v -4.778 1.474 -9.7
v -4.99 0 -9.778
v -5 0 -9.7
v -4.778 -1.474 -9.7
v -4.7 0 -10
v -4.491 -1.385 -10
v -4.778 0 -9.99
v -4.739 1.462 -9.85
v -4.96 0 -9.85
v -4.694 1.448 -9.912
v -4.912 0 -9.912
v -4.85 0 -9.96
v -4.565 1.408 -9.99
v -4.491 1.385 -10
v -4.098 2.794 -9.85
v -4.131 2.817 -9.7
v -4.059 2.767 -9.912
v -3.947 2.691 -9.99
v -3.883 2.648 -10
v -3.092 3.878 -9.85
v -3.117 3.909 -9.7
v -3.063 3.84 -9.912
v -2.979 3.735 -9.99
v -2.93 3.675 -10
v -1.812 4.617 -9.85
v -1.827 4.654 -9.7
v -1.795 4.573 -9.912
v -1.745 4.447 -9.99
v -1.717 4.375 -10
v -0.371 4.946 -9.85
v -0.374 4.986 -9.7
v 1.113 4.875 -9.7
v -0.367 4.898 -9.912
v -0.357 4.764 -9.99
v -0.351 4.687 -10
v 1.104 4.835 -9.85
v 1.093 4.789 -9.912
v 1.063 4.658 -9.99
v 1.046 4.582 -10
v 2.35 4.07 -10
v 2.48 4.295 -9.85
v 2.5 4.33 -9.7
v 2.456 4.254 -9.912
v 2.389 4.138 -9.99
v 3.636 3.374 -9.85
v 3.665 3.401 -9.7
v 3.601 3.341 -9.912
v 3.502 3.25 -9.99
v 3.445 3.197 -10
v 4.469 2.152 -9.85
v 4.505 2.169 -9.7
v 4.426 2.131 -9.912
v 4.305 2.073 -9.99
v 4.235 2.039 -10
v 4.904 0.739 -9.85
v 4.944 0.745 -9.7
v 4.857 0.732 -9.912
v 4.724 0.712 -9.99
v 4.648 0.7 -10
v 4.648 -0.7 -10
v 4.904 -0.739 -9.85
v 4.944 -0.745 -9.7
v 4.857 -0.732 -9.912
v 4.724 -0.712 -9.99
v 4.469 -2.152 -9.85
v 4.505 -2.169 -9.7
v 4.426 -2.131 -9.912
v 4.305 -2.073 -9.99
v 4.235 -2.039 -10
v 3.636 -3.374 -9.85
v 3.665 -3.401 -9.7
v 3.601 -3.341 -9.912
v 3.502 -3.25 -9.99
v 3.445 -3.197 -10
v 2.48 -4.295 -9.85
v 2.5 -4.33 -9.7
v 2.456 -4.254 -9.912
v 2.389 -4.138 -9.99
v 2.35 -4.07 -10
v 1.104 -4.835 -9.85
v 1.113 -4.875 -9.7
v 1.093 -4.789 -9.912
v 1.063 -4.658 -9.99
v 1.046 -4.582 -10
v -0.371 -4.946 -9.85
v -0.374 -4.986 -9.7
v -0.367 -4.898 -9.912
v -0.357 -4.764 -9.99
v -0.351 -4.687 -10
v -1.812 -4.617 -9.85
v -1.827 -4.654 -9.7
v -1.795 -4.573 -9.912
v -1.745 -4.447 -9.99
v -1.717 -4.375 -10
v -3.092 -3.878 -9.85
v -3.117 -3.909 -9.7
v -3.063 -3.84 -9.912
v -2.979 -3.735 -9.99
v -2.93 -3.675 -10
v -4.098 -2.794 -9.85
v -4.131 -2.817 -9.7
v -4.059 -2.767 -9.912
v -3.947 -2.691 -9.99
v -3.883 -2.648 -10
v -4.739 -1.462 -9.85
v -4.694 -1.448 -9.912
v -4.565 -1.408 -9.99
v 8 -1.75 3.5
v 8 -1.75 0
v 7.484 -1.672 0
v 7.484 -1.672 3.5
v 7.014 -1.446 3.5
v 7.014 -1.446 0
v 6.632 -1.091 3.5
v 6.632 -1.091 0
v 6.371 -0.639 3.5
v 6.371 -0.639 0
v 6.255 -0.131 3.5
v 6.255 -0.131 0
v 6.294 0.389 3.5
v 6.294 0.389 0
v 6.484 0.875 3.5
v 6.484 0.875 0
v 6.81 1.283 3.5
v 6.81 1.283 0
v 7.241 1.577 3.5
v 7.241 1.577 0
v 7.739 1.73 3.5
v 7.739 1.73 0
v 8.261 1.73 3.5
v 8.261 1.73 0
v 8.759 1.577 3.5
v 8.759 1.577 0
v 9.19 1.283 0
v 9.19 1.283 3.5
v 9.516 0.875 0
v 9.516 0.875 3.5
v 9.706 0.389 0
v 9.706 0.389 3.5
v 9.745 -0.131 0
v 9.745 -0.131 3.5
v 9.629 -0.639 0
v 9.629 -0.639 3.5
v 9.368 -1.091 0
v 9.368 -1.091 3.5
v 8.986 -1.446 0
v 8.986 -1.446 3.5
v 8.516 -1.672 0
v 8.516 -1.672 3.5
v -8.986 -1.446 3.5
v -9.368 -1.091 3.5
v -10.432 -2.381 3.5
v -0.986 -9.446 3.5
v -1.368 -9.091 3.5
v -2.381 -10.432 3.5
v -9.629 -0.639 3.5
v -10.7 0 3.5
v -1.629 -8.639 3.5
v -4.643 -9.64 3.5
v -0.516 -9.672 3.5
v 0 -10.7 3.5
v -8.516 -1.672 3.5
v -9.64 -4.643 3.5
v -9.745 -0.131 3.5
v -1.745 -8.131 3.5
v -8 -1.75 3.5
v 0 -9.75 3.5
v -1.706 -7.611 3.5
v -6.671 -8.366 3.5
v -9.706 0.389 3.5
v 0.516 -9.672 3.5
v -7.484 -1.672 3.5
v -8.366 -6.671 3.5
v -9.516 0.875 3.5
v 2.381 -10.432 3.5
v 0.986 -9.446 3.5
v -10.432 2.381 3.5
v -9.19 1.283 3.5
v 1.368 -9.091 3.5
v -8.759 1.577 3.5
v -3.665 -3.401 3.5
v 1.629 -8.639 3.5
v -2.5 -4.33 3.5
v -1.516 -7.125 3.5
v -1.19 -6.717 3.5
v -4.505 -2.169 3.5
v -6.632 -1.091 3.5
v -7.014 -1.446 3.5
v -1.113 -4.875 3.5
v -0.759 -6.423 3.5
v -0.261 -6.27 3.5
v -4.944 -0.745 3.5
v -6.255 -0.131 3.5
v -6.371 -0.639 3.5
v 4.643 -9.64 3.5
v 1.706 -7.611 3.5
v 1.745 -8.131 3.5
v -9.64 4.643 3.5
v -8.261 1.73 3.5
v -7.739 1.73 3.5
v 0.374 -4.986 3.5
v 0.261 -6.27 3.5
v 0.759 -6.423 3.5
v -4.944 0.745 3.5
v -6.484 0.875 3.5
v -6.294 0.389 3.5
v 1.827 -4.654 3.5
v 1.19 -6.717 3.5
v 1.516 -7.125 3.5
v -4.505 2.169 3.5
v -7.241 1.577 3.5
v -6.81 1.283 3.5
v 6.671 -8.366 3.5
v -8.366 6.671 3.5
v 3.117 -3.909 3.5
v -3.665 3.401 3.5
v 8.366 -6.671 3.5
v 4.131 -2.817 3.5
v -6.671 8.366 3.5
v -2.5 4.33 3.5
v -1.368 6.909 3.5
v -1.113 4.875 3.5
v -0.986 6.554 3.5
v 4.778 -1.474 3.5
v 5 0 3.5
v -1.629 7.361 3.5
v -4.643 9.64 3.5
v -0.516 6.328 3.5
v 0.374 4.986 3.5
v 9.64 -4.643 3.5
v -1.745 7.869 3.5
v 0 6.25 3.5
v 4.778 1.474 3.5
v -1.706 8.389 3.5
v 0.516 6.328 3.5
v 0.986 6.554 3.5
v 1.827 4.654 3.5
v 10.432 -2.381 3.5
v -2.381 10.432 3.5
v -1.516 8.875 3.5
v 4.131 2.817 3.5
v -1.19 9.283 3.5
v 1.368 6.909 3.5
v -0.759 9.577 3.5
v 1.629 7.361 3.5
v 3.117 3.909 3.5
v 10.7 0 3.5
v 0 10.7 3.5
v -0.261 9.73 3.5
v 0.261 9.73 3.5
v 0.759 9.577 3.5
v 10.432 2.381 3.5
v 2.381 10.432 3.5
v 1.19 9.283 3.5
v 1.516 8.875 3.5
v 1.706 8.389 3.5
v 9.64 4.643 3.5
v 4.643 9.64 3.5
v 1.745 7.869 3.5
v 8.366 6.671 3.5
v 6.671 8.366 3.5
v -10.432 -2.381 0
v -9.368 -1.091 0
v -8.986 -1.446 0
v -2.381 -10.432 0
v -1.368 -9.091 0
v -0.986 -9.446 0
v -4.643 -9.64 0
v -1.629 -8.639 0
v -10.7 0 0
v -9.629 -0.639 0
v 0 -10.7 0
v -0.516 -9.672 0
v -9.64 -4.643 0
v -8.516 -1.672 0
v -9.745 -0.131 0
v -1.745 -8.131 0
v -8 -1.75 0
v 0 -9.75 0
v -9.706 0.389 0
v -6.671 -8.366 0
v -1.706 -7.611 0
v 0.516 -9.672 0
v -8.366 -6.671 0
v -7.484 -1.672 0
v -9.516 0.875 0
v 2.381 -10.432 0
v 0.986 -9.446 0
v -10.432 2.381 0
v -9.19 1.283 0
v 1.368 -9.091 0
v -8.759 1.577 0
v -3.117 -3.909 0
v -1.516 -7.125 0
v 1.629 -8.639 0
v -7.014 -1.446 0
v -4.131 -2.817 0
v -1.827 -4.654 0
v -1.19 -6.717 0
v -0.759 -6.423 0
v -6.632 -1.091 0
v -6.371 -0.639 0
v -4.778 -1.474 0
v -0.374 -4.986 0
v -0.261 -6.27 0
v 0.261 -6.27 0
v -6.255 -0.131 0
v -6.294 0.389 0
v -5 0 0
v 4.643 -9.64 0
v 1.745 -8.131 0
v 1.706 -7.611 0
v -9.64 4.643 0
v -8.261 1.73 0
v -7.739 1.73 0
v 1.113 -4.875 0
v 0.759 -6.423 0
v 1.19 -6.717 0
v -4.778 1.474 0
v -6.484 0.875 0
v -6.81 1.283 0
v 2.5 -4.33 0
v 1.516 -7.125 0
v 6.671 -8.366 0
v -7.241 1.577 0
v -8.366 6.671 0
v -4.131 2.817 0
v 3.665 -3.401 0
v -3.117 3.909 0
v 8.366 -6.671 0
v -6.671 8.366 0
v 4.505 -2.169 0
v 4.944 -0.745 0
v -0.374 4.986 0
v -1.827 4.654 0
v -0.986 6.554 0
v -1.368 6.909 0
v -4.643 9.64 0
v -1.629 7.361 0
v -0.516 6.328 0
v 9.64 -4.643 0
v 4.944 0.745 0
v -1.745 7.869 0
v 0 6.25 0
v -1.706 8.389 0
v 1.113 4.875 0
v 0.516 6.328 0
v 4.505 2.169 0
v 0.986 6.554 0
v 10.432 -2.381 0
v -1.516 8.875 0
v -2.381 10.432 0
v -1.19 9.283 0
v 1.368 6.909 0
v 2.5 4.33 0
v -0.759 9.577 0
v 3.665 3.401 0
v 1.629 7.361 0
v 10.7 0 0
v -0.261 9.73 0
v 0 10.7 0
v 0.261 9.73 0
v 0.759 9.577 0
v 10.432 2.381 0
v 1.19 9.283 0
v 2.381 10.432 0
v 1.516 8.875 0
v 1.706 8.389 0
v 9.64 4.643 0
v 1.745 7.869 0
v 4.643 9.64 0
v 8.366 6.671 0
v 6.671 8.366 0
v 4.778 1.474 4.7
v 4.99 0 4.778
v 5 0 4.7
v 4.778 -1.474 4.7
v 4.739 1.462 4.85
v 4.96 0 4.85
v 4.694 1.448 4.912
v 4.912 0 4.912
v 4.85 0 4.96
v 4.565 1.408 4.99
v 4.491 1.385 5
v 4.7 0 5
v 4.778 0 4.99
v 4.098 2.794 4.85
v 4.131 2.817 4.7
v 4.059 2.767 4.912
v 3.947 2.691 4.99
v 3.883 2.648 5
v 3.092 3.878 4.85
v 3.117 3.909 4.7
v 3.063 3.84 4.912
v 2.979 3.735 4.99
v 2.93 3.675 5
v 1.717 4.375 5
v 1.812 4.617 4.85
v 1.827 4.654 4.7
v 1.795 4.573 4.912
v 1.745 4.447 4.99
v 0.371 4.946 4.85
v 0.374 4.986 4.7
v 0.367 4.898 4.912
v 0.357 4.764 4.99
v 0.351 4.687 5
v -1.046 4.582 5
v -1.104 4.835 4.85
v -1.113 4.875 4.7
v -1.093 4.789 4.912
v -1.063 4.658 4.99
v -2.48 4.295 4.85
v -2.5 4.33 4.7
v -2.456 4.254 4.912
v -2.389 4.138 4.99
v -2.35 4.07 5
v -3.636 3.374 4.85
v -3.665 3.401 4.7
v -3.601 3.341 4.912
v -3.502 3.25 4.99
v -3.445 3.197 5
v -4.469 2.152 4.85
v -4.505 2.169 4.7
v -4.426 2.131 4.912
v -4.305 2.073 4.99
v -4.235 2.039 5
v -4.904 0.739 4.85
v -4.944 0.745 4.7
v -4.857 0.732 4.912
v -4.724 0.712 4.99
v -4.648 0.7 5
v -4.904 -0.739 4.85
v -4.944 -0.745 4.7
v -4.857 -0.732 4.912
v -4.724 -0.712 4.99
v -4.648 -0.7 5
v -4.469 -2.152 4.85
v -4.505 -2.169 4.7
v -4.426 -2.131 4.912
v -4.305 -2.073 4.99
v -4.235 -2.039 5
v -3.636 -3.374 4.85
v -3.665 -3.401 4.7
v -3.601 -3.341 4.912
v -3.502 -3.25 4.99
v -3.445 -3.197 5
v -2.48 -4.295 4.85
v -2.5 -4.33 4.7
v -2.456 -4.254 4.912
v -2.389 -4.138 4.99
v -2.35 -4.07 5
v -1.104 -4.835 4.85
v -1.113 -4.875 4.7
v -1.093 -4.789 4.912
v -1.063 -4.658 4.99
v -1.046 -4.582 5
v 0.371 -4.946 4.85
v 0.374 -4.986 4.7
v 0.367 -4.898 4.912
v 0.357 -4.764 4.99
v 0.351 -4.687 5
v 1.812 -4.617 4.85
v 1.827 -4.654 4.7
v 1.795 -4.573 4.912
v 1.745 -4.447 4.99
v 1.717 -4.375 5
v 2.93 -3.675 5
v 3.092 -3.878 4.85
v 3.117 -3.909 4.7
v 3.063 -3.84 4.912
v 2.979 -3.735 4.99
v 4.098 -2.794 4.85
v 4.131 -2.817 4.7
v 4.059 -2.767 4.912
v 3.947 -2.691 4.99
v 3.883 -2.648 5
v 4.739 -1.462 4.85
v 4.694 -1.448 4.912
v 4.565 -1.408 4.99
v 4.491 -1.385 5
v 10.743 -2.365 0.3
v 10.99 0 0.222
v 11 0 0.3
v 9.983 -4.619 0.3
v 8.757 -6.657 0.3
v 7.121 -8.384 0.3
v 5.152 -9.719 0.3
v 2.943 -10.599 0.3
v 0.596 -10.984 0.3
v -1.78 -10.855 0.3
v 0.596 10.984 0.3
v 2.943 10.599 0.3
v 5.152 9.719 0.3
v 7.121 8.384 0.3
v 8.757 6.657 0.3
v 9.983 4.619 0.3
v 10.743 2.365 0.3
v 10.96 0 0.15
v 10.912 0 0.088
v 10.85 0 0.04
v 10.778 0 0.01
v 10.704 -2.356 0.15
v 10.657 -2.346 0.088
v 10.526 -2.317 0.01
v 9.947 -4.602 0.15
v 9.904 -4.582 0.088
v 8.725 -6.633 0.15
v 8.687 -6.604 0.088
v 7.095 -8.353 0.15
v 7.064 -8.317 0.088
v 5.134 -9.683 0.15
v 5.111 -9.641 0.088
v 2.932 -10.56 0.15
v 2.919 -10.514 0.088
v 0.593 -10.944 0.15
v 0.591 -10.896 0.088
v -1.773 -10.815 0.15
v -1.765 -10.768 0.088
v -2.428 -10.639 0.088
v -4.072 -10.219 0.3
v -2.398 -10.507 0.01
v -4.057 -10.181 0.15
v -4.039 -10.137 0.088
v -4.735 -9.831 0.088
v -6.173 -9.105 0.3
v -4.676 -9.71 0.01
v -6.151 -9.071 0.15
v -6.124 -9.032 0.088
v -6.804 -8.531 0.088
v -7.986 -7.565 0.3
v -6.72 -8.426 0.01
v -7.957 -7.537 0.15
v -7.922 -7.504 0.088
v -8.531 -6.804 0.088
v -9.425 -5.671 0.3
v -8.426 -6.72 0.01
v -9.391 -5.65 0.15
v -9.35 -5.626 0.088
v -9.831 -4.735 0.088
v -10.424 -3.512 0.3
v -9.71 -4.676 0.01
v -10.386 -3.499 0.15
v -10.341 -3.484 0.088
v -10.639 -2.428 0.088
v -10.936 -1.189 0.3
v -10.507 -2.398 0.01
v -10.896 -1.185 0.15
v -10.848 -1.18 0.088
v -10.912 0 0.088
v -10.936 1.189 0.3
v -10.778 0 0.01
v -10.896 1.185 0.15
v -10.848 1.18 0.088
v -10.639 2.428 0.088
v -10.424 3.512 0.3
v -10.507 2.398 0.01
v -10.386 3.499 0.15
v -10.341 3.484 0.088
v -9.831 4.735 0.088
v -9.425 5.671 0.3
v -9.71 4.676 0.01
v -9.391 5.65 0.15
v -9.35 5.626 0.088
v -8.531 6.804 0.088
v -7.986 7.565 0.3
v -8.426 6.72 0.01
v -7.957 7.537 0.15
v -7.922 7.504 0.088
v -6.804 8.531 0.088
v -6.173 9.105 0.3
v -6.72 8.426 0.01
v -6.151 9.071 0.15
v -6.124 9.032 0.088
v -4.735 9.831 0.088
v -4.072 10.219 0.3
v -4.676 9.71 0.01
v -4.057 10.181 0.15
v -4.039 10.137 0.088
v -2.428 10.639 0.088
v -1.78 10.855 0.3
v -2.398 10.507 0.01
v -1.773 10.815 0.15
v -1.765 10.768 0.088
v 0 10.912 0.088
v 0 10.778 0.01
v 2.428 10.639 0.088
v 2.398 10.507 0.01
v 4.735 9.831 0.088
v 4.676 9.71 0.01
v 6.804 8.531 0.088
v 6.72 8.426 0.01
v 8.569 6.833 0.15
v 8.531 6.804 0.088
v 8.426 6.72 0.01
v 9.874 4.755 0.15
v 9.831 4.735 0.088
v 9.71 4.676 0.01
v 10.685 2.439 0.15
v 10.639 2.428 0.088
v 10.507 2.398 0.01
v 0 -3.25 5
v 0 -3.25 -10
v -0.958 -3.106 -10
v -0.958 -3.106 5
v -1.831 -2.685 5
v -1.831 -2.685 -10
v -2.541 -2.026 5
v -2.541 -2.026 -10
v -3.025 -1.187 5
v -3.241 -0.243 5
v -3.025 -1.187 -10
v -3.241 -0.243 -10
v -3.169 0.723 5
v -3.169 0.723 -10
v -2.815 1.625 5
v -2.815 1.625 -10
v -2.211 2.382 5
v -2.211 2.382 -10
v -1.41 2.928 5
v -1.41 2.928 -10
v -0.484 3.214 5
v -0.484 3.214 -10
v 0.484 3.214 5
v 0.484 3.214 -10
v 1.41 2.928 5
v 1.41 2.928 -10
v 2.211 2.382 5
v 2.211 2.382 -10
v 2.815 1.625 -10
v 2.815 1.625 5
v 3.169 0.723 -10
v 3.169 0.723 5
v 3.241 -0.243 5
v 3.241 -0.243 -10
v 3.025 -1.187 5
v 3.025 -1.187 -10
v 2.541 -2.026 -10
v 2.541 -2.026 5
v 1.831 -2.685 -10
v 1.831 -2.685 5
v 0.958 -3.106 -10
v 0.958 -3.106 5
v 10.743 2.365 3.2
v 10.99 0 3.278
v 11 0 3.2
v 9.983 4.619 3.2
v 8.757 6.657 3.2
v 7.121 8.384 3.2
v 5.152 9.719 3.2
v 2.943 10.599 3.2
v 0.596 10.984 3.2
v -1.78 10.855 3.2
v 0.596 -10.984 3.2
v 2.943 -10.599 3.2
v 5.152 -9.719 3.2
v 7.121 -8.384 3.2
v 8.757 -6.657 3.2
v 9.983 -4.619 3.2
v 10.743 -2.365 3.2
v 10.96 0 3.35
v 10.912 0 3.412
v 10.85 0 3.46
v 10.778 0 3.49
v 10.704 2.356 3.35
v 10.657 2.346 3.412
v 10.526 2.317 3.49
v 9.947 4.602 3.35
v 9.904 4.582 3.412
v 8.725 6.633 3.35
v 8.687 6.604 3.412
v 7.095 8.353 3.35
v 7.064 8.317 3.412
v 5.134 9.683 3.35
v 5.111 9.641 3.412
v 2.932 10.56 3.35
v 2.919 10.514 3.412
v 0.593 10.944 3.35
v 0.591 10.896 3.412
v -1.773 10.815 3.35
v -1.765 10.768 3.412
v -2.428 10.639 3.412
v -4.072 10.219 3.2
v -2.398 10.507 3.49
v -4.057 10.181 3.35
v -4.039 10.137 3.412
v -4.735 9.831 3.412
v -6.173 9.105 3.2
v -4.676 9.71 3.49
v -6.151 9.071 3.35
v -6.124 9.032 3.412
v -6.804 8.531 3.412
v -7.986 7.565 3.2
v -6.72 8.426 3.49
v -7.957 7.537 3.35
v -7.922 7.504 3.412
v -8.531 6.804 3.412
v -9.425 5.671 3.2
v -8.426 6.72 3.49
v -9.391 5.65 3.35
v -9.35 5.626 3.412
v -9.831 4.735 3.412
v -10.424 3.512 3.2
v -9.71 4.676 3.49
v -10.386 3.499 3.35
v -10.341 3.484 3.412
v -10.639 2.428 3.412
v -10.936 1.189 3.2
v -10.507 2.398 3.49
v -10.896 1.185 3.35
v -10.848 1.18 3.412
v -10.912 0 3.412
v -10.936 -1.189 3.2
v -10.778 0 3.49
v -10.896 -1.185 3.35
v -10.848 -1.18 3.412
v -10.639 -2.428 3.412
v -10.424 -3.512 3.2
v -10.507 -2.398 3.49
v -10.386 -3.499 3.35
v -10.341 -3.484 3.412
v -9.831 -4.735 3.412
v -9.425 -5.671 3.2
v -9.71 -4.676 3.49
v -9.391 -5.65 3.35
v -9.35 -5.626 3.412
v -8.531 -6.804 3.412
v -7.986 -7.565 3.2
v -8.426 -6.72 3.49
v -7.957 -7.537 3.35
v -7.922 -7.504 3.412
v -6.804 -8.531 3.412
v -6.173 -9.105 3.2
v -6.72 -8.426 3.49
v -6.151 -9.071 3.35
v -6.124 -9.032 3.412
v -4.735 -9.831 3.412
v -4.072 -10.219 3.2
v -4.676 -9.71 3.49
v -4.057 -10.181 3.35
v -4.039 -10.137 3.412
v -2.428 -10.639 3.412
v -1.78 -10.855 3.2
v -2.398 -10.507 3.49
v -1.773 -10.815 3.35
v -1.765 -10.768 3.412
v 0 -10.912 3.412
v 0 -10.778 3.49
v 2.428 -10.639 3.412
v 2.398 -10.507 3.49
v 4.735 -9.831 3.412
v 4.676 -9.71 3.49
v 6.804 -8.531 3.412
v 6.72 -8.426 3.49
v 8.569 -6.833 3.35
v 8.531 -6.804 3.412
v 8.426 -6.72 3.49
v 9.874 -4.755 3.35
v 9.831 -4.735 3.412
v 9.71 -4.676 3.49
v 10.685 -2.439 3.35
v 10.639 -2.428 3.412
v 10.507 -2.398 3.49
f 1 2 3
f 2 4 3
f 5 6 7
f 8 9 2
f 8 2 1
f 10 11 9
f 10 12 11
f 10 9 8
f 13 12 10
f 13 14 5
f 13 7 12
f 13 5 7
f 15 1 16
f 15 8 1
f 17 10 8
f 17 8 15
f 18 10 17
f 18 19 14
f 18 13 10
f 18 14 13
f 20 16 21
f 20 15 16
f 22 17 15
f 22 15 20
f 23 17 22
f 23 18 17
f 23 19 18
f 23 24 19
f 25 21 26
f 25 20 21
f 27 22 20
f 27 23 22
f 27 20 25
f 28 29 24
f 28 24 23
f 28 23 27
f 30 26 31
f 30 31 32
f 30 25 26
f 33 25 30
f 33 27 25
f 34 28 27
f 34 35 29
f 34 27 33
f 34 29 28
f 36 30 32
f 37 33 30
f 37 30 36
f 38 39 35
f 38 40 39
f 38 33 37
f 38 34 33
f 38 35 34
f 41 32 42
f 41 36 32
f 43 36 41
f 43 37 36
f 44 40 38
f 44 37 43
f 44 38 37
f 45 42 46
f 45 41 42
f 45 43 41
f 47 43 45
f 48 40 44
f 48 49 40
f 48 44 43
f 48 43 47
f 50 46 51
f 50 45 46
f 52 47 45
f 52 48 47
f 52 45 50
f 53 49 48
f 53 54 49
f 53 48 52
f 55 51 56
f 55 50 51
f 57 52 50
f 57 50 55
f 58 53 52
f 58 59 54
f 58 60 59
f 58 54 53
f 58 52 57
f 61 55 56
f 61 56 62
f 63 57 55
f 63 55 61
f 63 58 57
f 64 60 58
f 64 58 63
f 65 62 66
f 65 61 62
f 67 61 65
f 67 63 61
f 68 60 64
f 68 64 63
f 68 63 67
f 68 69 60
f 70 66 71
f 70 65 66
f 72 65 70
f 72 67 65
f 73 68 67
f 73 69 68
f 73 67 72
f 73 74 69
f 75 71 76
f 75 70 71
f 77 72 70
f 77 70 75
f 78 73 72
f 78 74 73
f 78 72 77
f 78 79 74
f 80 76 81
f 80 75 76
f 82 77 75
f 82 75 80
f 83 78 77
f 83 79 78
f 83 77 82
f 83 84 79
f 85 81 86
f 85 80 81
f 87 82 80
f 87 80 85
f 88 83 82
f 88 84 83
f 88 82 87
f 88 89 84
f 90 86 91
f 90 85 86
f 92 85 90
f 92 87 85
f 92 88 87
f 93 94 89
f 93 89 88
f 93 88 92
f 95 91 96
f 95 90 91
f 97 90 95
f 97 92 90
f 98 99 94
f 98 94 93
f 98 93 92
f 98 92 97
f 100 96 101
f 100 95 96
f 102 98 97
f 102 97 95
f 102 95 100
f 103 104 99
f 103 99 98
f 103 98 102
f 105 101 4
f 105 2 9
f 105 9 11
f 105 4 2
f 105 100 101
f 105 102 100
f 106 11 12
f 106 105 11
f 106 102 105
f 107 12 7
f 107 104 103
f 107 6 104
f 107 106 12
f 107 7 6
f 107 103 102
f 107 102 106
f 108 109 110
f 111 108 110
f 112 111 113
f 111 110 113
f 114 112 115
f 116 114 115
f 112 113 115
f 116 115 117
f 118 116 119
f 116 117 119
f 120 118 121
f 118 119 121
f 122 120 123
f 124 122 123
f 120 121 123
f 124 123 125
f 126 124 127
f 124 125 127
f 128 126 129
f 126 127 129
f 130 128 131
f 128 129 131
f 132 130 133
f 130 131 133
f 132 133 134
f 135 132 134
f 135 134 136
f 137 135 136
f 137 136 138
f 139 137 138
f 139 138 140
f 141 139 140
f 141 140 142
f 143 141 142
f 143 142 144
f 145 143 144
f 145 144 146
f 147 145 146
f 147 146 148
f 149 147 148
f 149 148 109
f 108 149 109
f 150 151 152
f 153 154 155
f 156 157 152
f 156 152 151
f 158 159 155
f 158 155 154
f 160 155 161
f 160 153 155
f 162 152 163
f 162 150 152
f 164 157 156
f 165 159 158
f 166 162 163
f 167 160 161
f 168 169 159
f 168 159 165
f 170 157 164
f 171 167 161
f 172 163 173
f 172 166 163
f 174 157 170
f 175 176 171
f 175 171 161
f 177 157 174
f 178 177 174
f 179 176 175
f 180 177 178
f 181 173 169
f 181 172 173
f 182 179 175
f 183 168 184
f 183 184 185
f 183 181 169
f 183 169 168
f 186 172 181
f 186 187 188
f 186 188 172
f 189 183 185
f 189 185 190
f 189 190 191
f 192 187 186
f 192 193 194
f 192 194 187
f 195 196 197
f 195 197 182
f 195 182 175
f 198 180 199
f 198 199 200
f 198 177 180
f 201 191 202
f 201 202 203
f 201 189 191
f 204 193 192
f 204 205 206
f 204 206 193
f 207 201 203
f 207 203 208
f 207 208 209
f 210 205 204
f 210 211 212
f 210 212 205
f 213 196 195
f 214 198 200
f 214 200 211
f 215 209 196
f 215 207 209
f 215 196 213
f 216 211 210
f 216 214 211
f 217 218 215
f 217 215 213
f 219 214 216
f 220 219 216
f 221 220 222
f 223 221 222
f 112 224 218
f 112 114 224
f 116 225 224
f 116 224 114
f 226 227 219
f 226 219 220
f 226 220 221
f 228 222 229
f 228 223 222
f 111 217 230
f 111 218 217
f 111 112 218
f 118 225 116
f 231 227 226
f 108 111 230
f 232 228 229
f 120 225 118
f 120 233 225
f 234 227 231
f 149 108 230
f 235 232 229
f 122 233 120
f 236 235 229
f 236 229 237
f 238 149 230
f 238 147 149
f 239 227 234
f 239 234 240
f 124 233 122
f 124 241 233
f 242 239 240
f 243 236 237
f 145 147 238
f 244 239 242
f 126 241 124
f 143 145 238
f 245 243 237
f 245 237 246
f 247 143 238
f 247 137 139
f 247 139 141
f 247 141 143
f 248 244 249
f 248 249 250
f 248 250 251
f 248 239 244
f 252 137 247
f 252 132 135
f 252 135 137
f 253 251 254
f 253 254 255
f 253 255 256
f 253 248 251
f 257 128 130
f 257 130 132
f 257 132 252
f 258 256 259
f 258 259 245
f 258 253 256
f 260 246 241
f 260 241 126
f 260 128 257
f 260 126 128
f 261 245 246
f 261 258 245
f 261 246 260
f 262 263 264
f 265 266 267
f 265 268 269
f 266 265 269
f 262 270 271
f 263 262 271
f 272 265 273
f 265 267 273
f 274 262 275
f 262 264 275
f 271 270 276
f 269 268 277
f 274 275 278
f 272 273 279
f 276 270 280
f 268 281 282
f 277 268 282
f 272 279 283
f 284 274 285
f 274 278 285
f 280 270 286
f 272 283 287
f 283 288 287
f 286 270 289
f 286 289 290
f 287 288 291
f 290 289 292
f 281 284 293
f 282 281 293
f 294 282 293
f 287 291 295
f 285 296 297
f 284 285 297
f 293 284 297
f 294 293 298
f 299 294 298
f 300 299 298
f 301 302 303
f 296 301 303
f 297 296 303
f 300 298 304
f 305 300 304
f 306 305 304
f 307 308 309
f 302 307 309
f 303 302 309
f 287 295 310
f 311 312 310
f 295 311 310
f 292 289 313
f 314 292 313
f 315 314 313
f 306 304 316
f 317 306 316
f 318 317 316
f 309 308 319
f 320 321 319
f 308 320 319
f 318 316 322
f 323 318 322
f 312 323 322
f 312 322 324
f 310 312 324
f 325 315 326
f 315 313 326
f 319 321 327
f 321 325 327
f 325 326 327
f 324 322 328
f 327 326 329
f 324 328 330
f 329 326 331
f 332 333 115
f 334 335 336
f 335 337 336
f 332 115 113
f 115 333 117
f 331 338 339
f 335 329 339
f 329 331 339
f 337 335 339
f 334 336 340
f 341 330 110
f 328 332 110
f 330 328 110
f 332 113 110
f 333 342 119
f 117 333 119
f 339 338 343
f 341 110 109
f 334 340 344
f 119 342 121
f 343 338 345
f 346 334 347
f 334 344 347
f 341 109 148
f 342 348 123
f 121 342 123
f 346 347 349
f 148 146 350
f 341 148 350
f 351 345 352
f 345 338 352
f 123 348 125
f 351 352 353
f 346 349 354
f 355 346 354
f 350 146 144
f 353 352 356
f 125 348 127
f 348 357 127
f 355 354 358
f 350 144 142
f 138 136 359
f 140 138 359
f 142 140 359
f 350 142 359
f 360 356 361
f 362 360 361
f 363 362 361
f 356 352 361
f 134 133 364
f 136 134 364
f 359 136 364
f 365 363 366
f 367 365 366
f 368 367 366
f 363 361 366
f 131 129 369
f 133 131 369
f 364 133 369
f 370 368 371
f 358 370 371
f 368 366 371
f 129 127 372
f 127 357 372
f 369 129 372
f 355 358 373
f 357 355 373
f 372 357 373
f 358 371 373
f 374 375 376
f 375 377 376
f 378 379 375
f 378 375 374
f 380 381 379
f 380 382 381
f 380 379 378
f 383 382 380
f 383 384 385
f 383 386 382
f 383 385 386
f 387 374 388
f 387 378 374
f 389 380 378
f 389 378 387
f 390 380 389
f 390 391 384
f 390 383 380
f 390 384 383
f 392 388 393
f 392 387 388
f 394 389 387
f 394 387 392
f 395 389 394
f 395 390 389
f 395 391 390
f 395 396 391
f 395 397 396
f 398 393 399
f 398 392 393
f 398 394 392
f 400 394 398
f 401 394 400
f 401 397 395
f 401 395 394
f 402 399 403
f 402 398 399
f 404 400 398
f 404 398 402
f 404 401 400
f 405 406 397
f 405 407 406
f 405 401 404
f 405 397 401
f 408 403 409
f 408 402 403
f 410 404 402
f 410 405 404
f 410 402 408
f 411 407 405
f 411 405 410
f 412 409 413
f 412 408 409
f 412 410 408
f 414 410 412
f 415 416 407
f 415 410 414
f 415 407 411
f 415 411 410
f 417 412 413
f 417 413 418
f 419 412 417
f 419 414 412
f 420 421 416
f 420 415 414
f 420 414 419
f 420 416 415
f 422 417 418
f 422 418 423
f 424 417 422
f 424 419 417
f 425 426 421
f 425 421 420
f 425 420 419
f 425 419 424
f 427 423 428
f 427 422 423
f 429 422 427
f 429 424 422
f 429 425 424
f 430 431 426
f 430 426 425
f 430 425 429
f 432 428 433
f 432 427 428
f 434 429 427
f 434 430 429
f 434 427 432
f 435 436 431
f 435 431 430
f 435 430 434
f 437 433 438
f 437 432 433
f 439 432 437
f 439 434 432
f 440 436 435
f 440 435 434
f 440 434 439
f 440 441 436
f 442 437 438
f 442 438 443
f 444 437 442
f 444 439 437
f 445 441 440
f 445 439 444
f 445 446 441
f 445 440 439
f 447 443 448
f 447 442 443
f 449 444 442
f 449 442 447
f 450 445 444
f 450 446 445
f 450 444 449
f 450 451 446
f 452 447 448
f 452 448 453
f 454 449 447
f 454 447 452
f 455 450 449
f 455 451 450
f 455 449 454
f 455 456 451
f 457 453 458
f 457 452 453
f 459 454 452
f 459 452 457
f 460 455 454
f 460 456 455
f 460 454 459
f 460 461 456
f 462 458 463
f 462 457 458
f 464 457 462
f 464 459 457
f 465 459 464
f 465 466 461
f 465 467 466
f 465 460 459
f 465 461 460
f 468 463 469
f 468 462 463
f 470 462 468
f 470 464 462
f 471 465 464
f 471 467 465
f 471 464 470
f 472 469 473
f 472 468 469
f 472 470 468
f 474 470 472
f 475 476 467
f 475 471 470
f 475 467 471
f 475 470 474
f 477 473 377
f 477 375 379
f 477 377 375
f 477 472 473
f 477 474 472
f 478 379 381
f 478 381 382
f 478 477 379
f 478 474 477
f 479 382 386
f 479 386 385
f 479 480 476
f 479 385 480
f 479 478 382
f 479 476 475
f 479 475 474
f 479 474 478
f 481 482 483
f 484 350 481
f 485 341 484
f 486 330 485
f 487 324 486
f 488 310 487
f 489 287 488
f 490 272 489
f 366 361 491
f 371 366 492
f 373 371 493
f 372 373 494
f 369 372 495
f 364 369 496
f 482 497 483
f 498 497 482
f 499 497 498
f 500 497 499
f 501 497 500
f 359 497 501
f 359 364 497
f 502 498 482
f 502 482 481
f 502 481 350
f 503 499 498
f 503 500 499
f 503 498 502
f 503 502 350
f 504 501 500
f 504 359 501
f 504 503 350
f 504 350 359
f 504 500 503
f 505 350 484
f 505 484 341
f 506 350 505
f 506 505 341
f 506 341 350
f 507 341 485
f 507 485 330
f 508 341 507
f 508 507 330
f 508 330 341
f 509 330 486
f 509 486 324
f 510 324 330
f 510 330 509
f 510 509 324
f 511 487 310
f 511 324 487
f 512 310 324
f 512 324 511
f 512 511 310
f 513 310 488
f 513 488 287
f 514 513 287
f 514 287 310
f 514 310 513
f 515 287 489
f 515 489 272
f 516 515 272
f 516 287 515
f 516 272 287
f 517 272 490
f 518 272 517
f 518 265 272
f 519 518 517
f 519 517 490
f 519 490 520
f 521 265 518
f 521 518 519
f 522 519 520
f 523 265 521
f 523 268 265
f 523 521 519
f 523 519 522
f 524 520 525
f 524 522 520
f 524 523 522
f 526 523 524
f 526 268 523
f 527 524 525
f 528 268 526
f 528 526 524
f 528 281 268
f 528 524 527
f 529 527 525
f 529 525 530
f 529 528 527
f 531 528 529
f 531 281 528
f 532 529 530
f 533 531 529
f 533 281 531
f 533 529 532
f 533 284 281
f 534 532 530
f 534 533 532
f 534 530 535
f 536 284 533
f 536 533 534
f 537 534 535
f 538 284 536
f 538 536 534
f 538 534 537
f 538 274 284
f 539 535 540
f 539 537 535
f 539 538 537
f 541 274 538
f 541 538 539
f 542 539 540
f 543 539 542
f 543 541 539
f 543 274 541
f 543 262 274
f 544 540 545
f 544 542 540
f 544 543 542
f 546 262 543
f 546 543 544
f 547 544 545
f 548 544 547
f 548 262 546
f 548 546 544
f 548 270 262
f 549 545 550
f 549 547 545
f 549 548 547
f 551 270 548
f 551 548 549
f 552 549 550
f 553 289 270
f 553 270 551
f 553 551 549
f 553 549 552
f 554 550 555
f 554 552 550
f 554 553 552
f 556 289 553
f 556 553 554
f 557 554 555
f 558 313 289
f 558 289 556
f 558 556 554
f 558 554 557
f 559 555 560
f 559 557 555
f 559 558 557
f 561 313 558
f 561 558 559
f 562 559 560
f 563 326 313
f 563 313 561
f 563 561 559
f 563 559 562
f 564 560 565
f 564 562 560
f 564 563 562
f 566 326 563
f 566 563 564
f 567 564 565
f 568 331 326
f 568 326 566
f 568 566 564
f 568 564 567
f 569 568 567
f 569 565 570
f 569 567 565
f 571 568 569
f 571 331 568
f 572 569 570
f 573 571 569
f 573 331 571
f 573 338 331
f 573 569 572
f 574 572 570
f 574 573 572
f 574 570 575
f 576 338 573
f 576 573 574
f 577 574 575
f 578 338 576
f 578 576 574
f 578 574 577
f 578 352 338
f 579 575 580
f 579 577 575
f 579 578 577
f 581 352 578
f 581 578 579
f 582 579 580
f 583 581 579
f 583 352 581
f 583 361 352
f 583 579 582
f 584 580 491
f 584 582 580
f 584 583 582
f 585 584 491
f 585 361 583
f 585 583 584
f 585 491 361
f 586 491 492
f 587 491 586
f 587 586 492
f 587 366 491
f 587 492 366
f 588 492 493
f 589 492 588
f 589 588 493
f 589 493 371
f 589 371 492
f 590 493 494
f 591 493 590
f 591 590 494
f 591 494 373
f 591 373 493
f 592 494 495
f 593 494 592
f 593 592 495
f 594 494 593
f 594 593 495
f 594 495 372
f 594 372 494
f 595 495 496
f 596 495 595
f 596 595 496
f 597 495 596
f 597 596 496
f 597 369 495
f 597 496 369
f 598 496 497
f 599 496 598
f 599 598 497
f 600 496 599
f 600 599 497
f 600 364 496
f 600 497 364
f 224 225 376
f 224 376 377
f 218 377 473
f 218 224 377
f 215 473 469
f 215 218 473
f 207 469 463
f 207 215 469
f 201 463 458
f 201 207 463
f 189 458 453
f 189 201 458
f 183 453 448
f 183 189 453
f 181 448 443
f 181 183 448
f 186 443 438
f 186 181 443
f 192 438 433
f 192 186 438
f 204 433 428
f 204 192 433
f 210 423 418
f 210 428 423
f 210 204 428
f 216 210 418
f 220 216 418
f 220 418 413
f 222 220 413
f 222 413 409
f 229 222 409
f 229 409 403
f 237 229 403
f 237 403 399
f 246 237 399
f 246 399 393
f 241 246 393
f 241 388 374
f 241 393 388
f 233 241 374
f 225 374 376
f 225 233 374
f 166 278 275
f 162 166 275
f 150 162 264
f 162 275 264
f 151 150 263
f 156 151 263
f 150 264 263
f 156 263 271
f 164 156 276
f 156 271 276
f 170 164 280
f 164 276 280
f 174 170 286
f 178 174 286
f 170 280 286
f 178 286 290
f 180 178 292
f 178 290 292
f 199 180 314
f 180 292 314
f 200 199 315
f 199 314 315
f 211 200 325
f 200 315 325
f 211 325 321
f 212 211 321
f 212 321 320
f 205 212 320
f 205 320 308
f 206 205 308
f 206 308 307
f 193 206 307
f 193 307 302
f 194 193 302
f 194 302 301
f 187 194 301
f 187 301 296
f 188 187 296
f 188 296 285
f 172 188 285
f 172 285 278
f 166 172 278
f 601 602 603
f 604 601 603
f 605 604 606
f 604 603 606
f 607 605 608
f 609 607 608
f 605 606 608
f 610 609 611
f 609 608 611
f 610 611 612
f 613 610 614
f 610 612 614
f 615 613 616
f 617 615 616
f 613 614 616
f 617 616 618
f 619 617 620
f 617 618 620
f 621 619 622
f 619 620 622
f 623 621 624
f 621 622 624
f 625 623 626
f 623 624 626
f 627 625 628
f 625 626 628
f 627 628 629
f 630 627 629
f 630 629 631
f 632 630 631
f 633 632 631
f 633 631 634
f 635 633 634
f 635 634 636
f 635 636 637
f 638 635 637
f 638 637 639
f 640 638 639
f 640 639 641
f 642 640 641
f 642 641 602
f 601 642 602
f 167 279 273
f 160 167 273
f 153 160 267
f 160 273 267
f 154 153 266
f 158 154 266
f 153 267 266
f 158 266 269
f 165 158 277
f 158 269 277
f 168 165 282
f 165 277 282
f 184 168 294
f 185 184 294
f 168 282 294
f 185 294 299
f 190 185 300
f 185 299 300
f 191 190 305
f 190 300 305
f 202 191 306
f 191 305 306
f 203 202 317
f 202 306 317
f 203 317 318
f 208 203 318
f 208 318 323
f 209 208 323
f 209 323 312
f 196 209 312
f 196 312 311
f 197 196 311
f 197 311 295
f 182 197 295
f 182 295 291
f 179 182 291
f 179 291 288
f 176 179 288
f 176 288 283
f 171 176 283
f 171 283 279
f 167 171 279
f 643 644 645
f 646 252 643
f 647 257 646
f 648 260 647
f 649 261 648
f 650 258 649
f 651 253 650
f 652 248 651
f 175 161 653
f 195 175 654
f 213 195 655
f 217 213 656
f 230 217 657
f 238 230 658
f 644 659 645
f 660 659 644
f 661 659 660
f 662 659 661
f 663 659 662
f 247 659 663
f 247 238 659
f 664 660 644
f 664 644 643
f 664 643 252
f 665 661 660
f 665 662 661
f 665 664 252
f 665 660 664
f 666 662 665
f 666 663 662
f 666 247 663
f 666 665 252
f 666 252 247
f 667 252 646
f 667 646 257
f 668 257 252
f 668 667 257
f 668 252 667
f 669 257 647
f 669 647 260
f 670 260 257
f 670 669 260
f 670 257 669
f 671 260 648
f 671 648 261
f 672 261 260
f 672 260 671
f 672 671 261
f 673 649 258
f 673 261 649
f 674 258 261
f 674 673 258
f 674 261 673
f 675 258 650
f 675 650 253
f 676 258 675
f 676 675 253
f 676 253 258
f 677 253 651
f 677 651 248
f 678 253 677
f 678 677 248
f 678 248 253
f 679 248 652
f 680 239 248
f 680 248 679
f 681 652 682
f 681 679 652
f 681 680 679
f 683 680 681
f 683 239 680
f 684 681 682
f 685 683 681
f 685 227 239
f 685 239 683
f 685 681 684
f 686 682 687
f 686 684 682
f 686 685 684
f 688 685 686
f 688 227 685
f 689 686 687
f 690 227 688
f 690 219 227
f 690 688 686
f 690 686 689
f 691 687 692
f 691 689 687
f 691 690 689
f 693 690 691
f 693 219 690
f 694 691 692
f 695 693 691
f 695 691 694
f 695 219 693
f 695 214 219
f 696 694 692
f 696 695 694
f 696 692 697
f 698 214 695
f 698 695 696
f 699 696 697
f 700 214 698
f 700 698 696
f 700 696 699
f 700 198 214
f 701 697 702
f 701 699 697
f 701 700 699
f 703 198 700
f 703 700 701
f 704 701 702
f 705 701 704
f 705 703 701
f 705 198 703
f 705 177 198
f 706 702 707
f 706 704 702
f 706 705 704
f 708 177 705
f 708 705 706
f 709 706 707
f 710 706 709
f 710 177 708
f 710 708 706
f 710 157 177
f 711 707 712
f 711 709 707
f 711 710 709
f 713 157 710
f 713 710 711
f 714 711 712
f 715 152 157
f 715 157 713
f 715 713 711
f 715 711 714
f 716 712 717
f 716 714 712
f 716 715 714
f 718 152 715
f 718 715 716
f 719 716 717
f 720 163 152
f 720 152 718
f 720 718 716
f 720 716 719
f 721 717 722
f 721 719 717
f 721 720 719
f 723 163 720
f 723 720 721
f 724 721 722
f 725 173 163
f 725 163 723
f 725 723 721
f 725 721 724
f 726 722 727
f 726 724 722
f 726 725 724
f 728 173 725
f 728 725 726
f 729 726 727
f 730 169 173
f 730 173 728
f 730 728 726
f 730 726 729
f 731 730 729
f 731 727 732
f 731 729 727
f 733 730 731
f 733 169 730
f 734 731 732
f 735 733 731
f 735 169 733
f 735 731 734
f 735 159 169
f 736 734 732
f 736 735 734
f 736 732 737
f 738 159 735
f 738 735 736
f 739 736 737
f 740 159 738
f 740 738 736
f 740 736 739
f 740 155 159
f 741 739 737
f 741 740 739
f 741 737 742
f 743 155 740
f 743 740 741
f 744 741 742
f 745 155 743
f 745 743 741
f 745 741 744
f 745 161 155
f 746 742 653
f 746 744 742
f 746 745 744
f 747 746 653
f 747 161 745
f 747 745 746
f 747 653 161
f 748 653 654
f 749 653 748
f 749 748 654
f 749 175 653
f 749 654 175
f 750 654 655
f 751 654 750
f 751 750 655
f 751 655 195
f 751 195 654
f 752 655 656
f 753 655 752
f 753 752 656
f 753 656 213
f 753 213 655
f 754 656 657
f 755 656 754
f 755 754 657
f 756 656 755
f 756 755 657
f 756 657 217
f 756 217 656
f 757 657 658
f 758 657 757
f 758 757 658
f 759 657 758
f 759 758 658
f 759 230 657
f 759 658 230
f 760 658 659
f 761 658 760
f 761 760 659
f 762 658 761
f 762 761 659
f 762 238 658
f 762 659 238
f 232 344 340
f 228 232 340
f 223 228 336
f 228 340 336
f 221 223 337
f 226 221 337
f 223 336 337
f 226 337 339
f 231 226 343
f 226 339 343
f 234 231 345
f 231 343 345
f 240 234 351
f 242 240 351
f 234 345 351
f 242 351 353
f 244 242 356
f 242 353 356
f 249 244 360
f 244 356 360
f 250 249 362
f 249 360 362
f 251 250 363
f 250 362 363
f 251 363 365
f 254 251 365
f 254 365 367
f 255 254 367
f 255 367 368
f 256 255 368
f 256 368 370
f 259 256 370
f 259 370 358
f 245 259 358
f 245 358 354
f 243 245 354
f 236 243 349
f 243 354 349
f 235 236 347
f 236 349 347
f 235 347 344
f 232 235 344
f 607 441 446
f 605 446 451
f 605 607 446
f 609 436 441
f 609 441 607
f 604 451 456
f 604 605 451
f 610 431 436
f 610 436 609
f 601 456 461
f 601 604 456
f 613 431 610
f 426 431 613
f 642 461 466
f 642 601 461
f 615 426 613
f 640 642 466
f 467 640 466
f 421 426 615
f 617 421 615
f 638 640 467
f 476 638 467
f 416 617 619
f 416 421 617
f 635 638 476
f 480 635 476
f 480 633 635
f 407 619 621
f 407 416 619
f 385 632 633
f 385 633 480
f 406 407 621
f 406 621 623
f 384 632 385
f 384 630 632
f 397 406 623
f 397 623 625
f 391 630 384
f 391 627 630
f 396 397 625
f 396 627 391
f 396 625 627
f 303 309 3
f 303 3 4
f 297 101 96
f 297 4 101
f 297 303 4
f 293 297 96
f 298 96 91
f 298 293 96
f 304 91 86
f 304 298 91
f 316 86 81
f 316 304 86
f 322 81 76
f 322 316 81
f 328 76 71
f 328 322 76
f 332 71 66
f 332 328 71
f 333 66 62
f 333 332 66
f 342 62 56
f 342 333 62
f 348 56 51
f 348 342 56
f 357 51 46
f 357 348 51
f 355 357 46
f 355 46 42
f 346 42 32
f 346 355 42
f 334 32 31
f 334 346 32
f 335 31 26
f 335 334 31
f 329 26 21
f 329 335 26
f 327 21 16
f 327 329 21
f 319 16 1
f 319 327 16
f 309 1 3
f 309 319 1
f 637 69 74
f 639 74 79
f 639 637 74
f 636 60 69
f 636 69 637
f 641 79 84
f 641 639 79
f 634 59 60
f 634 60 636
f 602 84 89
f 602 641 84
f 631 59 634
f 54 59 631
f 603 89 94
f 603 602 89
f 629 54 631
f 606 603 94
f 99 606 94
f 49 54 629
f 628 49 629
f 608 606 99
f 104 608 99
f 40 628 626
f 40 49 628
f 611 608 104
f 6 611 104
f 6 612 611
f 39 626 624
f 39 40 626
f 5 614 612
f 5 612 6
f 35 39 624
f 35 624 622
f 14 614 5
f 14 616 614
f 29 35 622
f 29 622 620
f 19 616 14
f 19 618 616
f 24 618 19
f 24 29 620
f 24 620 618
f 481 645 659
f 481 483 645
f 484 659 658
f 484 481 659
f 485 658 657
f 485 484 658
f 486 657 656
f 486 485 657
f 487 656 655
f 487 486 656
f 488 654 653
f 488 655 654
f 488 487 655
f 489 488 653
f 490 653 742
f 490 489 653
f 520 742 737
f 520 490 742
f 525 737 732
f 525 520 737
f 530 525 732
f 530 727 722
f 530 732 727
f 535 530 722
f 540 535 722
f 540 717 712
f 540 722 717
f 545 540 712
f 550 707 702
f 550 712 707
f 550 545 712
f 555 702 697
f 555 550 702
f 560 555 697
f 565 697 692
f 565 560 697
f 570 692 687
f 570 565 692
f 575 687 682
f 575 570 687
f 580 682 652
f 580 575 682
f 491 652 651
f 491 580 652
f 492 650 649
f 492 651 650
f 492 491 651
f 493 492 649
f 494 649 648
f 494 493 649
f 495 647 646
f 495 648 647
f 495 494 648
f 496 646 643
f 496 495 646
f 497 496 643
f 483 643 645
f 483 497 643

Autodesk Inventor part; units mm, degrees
ref_plane "YZ Plane" through (0, 0, 0) normal (1, 0, 0) x (0, 1, 0)
ref_plane "XZ Plane" through (0, 0, 0) normal (0, 1, 0) x (-1, 0, 0)
ref_plane "XY Plane" through (0, 0, 0) normal (0, 0, 1) x (1, 0, 0)
sketch "Esboço1" plane through (0, 0, 0) normal (0, 0, 1) x (1, 0, 0)
  circle A0 centre (0, 0) radius 11
  dimension "d0" = 22
extrude "Extrusão1" add sketch "Esboço1" along normal blind 3.5
sketch "Esboço2" plane through (0, 0, 3.5) normal (0, 0, 1) x (1, 0, 0)
  circle A0 centre (0, 0) radius 5
  dimension "d3" = 10
extrude "Extrusão2" add sketch "Esboço2" along normal blind 1.5
sketch "Esboço3" plane through (0, 0, 0) normal (0, 0, -1) x (-1, 0, 0)
  circle A0 centre (0, 0) radius 5
  dimension "d6" = 10
extrude "Extrusão3" add sketch "Esboço3" along normal blind 10
sketch "Esboço4" plane through (0, 0, 3.5) normal (0, 0, 1) x (1, 0, 0)
  circle A0 centre (0, 0) radius 8 construction
  circle A1 centre (-8, 0) radius 1 construction
  circle A2 centre (0, -8) radius 1 construction
  circle A3 centre (0, 0) radius 8 construction
  circle A4 centre (8, 0) radius 1 construction
  circle A5 centre (0, 0) radius 8 construction
  circle A6 centre (0, 8) radius 1 construction
  circle A7 centre (0, 0) radius 8 construction
  dimension "d9" = 16
  dimension "d10" = 2
  dimension "d13" = 360
hole "Furo1" at (-8, 0, 3.5) at (0, -8, 3.5) at (8, 0, 3.5) at (0, 8, 3.5) direction (0, 0, -1) diameter 3.5 end through all
fillet "Arredondamento1" radius 0.3 4 edges at (-11, 0, 3.5) (-11, 0, 0) (5, 0, -10) (-5, 0, 5)
sketch "Esboço5" plane through (0, 0, 5) normal (0, 0, 1) x (1, 0, 0)
  circle A0 centre (0, 0) radius 1.5 construction
  dimension "d23" = 3
hole "Furo2" at (0, 0, 5) direction (0, 0, -1) diameter 6.5 end through all thread size "TR8x1.5" class "7H" standard "ISO Metric Trapezoidal Threads"
properties part number "CastanhaTR8"
